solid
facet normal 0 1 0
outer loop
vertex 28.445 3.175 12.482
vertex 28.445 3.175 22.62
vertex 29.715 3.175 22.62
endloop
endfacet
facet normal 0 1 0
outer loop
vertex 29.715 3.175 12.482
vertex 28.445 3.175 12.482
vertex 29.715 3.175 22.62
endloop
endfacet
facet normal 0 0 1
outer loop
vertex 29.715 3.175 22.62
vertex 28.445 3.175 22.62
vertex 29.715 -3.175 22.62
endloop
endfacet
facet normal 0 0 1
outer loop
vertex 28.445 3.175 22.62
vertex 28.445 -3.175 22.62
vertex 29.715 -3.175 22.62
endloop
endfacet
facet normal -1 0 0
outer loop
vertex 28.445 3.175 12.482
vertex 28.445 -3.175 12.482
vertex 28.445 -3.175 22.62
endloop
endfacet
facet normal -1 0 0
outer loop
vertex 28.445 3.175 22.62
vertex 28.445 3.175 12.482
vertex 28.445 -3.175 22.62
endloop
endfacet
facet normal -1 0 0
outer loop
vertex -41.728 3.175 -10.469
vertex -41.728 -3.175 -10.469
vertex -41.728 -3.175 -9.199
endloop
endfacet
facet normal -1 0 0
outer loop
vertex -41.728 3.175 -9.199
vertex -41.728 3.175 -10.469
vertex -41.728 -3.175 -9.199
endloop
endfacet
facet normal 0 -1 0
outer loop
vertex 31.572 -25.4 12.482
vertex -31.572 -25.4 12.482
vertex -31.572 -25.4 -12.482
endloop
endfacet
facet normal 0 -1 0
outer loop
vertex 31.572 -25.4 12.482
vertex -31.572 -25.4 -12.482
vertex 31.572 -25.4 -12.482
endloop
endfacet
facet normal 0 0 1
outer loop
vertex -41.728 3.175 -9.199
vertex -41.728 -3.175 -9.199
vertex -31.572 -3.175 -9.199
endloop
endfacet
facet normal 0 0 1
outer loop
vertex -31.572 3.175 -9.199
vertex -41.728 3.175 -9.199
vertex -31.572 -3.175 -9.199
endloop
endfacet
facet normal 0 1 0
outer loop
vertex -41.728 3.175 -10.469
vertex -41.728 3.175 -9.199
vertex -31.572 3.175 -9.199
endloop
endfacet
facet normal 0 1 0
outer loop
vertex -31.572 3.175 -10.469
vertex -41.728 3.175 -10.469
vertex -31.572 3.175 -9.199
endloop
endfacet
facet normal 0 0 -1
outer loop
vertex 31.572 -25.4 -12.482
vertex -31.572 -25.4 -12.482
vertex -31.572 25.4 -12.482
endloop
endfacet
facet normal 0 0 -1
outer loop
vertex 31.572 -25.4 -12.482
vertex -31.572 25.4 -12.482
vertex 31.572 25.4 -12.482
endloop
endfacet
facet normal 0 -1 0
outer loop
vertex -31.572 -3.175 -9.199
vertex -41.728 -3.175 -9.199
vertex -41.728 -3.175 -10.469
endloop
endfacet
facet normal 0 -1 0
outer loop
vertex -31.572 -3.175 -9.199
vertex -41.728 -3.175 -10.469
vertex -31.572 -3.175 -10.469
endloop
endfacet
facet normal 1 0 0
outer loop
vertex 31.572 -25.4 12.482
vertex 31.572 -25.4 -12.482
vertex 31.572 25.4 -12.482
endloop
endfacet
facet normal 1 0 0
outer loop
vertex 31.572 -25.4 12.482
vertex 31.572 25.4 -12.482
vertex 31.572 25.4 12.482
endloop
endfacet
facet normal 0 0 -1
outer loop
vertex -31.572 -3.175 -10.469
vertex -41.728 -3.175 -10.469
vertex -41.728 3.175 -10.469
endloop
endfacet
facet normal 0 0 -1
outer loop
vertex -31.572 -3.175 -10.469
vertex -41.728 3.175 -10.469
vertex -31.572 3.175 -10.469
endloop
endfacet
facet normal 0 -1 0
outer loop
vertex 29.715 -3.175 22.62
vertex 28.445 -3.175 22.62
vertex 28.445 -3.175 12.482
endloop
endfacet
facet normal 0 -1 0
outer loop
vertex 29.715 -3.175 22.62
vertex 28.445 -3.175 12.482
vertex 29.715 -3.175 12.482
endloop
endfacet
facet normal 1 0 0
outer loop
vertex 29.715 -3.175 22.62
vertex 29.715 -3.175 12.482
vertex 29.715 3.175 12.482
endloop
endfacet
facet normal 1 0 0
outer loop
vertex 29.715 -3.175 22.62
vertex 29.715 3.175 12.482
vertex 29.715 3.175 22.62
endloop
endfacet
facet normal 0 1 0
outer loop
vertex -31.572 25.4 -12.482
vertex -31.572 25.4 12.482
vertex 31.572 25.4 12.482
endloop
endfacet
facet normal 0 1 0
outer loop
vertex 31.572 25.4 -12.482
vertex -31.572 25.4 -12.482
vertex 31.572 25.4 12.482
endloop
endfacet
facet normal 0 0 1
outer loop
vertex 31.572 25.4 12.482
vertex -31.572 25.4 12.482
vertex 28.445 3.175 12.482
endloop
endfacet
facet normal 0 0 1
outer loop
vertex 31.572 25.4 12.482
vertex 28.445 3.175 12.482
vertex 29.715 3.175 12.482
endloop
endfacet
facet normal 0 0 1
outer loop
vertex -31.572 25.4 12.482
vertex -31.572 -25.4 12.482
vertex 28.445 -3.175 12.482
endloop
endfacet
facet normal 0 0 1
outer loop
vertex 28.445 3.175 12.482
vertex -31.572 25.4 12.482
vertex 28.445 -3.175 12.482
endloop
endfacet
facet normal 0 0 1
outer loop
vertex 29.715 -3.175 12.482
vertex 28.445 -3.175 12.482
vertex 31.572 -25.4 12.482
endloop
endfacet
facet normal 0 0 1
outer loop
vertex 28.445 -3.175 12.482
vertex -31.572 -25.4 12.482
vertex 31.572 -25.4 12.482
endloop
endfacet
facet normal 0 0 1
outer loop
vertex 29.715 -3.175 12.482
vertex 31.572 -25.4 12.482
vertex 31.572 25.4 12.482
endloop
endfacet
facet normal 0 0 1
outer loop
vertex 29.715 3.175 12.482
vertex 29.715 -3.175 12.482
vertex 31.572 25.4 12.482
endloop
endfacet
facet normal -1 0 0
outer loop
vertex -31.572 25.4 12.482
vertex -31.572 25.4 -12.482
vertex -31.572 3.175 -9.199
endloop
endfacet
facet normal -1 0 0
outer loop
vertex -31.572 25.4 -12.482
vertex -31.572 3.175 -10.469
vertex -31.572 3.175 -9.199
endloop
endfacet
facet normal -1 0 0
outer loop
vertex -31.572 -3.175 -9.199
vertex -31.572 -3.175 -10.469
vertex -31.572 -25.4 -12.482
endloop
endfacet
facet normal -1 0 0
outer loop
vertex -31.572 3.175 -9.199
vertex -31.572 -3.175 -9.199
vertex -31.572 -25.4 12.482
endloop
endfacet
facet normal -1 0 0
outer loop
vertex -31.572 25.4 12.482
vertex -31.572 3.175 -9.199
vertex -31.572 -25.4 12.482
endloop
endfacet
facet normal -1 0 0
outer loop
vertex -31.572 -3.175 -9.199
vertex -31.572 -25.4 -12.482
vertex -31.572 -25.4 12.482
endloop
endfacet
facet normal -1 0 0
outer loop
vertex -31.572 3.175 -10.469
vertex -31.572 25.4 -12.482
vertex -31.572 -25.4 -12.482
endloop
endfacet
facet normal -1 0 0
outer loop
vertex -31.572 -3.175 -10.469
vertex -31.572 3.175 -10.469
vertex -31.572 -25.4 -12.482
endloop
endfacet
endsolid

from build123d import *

# Parameters (mm, degrees)
F0_W     = 63.144043088
F0_H     = 24.9639227986
F1_DEPTH = 25.4
F2_W     = 1.27
F2_H     = 10.16
F3_DEPTH = 3.175
F4_W     = 10.16
F4_H     = 1.27
F5_DEPTH = 3.175


# Not quite as in the source:
# - a feature names something its author has since deleted; it is built from what else it names


with BuildPart() as f1:
    # F0 (on Front) → F1 (new body, symmetric)
    with BuildSketch(Plane.XZ):
        Rectangle(F0_W, F0_H)
    extrude(amount=F1_DEPTH, both=True)

    # F2 (on Front) → F3 (join, symmetric)
    with BuildSketch(Plane.XZ):
        with Locations((29.0800049829, 17.5400783525)):
            Rectangle(F2_W, F2_H)
    extrude(amount=F3_DEPTH, both=True)

    # F4 (on Front) → F5 (join, symmetric)
    with BuildSketch(Plane.XZ):
        with Locations((-36.6476550698, -9.8343824477)):
            Rectangle(F4_W, F4_H)
    extrude(amount=F5_DEPTH, both=True)


solid = f1.part
